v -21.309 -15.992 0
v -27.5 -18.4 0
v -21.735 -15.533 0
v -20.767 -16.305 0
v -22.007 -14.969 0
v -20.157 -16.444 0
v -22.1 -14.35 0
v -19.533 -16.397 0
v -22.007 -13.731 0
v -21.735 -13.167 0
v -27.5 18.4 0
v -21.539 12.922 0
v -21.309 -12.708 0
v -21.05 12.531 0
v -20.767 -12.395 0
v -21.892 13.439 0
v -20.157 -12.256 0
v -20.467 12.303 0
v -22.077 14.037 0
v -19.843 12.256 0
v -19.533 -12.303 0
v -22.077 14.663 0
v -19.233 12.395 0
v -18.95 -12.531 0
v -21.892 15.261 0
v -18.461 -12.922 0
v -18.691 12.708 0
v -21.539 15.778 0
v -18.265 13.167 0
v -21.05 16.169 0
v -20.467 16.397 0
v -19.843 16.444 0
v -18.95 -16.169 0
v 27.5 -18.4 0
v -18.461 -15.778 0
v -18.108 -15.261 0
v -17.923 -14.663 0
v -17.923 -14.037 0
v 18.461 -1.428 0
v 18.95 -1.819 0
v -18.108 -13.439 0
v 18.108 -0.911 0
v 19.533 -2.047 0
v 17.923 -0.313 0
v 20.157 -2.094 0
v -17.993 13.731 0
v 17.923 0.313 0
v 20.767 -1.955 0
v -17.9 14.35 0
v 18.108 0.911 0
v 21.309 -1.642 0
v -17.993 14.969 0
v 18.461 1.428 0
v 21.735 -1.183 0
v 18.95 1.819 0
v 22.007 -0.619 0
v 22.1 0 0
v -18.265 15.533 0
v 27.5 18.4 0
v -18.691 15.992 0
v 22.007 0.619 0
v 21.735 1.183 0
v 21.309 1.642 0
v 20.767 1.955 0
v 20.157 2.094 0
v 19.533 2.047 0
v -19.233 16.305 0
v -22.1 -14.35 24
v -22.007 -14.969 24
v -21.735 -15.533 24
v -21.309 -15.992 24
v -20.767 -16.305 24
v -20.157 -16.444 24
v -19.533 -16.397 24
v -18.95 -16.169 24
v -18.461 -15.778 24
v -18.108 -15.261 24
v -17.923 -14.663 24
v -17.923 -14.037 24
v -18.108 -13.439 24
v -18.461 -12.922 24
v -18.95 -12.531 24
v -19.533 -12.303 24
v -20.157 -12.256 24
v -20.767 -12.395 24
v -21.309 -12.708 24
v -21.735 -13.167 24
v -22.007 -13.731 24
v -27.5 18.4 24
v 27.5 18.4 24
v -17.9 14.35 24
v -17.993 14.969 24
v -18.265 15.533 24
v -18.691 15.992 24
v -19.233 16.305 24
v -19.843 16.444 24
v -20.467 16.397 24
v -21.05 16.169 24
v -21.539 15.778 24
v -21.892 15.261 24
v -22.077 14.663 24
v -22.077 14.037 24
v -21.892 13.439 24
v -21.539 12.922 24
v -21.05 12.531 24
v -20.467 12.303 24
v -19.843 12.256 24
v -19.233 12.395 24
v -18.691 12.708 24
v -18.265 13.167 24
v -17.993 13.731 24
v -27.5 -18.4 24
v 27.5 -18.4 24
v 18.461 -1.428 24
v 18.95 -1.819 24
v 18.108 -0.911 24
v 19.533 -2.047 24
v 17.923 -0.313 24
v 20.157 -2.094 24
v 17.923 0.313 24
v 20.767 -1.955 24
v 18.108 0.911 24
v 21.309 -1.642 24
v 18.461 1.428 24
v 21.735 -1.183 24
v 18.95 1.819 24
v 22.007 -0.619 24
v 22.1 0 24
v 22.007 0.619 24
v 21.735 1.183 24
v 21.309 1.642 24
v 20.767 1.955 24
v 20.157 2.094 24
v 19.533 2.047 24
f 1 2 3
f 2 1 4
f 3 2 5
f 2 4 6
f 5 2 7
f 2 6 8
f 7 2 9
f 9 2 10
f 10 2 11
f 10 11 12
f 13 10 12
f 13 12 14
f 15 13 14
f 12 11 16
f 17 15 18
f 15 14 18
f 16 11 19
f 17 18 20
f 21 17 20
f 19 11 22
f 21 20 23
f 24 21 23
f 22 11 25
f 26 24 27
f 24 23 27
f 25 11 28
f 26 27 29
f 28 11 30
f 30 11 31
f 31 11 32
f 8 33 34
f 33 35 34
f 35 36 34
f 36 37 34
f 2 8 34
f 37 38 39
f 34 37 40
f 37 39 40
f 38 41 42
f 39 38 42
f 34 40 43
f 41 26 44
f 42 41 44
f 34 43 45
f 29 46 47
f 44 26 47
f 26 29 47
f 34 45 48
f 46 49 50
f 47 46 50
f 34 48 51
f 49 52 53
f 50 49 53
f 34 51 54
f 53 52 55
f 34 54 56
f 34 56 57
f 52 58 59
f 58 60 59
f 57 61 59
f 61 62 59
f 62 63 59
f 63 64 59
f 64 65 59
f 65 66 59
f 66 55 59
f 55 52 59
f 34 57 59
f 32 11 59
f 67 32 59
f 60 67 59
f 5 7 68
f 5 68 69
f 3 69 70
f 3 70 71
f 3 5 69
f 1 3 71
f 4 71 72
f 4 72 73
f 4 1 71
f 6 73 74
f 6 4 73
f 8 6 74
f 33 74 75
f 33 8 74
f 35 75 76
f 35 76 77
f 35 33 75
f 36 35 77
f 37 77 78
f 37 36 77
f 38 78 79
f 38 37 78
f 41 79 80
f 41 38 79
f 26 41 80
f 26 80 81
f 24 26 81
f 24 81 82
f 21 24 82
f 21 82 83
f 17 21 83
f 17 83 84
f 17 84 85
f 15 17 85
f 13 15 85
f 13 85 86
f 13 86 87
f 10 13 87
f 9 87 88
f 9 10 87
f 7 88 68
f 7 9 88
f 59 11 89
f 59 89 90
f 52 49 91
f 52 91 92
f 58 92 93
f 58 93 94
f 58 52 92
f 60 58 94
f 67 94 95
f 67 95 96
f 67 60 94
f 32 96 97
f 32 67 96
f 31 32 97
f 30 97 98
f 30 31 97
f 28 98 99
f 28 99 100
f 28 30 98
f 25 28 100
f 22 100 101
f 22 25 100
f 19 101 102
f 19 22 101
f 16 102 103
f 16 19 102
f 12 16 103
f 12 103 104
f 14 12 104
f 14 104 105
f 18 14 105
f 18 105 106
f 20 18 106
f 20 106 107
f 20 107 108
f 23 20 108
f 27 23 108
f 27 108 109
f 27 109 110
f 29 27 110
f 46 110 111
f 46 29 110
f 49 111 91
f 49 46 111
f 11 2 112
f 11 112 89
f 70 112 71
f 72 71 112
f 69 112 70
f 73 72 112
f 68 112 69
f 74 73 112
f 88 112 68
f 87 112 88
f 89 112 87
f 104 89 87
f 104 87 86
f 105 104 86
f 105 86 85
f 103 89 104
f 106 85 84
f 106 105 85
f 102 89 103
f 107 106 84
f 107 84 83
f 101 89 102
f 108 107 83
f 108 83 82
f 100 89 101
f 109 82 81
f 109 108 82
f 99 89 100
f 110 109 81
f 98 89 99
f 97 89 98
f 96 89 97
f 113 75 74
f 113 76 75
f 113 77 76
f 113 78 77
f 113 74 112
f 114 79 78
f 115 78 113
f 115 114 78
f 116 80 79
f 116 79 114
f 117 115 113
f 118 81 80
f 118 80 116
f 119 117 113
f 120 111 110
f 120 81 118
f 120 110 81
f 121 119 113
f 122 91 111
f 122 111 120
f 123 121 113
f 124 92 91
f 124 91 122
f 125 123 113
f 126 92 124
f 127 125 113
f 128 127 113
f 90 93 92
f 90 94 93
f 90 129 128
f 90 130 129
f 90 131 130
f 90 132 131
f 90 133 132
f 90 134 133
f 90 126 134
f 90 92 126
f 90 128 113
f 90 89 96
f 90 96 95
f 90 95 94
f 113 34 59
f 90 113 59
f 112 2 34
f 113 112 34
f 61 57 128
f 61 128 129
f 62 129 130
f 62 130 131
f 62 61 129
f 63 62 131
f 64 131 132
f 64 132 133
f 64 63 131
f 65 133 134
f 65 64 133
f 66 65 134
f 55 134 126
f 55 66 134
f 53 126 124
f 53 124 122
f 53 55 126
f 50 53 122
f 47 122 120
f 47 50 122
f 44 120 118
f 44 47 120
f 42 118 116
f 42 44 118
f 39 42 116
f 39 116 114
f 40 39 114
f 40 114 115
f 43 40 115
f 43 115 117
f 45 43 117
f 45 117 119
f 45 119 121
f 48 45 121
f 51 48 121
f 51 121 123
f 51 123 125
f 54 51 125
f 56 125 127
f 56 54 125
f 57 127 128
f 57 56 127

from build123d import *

# Parameters (mm, degrees)
SKETCH_1_W      = 55
SKETCH_1_H      = 36.8
SKETCH_1_R      = 2.1
EXTRUDE_1_DEPTH = 24


with BuildPart() as part:
    # 草图1 → 凸台-拉伸1 (new body)
    with BuildSketch(Plane.XY):
        Rectangle(SKETCH_1_W, SKETCH_1_H)
        with Locations((-20, 14.35)):
            Circle(SKETCH_1_R, mode=Mode.SUBTRACT)
        with Locations((20, 0)):
            Circle(SKETCH_1_R, mode=Mode.SUBTRACT)
        with Locations(Location((-20, -14.35, 0), (0, 0, 180))):
            Circle(SKETCH_1_R, mode=Mode.SUBTRACT)
    extrude(amount=EXTRUDE_1_DEPTH)


solid = part.part
